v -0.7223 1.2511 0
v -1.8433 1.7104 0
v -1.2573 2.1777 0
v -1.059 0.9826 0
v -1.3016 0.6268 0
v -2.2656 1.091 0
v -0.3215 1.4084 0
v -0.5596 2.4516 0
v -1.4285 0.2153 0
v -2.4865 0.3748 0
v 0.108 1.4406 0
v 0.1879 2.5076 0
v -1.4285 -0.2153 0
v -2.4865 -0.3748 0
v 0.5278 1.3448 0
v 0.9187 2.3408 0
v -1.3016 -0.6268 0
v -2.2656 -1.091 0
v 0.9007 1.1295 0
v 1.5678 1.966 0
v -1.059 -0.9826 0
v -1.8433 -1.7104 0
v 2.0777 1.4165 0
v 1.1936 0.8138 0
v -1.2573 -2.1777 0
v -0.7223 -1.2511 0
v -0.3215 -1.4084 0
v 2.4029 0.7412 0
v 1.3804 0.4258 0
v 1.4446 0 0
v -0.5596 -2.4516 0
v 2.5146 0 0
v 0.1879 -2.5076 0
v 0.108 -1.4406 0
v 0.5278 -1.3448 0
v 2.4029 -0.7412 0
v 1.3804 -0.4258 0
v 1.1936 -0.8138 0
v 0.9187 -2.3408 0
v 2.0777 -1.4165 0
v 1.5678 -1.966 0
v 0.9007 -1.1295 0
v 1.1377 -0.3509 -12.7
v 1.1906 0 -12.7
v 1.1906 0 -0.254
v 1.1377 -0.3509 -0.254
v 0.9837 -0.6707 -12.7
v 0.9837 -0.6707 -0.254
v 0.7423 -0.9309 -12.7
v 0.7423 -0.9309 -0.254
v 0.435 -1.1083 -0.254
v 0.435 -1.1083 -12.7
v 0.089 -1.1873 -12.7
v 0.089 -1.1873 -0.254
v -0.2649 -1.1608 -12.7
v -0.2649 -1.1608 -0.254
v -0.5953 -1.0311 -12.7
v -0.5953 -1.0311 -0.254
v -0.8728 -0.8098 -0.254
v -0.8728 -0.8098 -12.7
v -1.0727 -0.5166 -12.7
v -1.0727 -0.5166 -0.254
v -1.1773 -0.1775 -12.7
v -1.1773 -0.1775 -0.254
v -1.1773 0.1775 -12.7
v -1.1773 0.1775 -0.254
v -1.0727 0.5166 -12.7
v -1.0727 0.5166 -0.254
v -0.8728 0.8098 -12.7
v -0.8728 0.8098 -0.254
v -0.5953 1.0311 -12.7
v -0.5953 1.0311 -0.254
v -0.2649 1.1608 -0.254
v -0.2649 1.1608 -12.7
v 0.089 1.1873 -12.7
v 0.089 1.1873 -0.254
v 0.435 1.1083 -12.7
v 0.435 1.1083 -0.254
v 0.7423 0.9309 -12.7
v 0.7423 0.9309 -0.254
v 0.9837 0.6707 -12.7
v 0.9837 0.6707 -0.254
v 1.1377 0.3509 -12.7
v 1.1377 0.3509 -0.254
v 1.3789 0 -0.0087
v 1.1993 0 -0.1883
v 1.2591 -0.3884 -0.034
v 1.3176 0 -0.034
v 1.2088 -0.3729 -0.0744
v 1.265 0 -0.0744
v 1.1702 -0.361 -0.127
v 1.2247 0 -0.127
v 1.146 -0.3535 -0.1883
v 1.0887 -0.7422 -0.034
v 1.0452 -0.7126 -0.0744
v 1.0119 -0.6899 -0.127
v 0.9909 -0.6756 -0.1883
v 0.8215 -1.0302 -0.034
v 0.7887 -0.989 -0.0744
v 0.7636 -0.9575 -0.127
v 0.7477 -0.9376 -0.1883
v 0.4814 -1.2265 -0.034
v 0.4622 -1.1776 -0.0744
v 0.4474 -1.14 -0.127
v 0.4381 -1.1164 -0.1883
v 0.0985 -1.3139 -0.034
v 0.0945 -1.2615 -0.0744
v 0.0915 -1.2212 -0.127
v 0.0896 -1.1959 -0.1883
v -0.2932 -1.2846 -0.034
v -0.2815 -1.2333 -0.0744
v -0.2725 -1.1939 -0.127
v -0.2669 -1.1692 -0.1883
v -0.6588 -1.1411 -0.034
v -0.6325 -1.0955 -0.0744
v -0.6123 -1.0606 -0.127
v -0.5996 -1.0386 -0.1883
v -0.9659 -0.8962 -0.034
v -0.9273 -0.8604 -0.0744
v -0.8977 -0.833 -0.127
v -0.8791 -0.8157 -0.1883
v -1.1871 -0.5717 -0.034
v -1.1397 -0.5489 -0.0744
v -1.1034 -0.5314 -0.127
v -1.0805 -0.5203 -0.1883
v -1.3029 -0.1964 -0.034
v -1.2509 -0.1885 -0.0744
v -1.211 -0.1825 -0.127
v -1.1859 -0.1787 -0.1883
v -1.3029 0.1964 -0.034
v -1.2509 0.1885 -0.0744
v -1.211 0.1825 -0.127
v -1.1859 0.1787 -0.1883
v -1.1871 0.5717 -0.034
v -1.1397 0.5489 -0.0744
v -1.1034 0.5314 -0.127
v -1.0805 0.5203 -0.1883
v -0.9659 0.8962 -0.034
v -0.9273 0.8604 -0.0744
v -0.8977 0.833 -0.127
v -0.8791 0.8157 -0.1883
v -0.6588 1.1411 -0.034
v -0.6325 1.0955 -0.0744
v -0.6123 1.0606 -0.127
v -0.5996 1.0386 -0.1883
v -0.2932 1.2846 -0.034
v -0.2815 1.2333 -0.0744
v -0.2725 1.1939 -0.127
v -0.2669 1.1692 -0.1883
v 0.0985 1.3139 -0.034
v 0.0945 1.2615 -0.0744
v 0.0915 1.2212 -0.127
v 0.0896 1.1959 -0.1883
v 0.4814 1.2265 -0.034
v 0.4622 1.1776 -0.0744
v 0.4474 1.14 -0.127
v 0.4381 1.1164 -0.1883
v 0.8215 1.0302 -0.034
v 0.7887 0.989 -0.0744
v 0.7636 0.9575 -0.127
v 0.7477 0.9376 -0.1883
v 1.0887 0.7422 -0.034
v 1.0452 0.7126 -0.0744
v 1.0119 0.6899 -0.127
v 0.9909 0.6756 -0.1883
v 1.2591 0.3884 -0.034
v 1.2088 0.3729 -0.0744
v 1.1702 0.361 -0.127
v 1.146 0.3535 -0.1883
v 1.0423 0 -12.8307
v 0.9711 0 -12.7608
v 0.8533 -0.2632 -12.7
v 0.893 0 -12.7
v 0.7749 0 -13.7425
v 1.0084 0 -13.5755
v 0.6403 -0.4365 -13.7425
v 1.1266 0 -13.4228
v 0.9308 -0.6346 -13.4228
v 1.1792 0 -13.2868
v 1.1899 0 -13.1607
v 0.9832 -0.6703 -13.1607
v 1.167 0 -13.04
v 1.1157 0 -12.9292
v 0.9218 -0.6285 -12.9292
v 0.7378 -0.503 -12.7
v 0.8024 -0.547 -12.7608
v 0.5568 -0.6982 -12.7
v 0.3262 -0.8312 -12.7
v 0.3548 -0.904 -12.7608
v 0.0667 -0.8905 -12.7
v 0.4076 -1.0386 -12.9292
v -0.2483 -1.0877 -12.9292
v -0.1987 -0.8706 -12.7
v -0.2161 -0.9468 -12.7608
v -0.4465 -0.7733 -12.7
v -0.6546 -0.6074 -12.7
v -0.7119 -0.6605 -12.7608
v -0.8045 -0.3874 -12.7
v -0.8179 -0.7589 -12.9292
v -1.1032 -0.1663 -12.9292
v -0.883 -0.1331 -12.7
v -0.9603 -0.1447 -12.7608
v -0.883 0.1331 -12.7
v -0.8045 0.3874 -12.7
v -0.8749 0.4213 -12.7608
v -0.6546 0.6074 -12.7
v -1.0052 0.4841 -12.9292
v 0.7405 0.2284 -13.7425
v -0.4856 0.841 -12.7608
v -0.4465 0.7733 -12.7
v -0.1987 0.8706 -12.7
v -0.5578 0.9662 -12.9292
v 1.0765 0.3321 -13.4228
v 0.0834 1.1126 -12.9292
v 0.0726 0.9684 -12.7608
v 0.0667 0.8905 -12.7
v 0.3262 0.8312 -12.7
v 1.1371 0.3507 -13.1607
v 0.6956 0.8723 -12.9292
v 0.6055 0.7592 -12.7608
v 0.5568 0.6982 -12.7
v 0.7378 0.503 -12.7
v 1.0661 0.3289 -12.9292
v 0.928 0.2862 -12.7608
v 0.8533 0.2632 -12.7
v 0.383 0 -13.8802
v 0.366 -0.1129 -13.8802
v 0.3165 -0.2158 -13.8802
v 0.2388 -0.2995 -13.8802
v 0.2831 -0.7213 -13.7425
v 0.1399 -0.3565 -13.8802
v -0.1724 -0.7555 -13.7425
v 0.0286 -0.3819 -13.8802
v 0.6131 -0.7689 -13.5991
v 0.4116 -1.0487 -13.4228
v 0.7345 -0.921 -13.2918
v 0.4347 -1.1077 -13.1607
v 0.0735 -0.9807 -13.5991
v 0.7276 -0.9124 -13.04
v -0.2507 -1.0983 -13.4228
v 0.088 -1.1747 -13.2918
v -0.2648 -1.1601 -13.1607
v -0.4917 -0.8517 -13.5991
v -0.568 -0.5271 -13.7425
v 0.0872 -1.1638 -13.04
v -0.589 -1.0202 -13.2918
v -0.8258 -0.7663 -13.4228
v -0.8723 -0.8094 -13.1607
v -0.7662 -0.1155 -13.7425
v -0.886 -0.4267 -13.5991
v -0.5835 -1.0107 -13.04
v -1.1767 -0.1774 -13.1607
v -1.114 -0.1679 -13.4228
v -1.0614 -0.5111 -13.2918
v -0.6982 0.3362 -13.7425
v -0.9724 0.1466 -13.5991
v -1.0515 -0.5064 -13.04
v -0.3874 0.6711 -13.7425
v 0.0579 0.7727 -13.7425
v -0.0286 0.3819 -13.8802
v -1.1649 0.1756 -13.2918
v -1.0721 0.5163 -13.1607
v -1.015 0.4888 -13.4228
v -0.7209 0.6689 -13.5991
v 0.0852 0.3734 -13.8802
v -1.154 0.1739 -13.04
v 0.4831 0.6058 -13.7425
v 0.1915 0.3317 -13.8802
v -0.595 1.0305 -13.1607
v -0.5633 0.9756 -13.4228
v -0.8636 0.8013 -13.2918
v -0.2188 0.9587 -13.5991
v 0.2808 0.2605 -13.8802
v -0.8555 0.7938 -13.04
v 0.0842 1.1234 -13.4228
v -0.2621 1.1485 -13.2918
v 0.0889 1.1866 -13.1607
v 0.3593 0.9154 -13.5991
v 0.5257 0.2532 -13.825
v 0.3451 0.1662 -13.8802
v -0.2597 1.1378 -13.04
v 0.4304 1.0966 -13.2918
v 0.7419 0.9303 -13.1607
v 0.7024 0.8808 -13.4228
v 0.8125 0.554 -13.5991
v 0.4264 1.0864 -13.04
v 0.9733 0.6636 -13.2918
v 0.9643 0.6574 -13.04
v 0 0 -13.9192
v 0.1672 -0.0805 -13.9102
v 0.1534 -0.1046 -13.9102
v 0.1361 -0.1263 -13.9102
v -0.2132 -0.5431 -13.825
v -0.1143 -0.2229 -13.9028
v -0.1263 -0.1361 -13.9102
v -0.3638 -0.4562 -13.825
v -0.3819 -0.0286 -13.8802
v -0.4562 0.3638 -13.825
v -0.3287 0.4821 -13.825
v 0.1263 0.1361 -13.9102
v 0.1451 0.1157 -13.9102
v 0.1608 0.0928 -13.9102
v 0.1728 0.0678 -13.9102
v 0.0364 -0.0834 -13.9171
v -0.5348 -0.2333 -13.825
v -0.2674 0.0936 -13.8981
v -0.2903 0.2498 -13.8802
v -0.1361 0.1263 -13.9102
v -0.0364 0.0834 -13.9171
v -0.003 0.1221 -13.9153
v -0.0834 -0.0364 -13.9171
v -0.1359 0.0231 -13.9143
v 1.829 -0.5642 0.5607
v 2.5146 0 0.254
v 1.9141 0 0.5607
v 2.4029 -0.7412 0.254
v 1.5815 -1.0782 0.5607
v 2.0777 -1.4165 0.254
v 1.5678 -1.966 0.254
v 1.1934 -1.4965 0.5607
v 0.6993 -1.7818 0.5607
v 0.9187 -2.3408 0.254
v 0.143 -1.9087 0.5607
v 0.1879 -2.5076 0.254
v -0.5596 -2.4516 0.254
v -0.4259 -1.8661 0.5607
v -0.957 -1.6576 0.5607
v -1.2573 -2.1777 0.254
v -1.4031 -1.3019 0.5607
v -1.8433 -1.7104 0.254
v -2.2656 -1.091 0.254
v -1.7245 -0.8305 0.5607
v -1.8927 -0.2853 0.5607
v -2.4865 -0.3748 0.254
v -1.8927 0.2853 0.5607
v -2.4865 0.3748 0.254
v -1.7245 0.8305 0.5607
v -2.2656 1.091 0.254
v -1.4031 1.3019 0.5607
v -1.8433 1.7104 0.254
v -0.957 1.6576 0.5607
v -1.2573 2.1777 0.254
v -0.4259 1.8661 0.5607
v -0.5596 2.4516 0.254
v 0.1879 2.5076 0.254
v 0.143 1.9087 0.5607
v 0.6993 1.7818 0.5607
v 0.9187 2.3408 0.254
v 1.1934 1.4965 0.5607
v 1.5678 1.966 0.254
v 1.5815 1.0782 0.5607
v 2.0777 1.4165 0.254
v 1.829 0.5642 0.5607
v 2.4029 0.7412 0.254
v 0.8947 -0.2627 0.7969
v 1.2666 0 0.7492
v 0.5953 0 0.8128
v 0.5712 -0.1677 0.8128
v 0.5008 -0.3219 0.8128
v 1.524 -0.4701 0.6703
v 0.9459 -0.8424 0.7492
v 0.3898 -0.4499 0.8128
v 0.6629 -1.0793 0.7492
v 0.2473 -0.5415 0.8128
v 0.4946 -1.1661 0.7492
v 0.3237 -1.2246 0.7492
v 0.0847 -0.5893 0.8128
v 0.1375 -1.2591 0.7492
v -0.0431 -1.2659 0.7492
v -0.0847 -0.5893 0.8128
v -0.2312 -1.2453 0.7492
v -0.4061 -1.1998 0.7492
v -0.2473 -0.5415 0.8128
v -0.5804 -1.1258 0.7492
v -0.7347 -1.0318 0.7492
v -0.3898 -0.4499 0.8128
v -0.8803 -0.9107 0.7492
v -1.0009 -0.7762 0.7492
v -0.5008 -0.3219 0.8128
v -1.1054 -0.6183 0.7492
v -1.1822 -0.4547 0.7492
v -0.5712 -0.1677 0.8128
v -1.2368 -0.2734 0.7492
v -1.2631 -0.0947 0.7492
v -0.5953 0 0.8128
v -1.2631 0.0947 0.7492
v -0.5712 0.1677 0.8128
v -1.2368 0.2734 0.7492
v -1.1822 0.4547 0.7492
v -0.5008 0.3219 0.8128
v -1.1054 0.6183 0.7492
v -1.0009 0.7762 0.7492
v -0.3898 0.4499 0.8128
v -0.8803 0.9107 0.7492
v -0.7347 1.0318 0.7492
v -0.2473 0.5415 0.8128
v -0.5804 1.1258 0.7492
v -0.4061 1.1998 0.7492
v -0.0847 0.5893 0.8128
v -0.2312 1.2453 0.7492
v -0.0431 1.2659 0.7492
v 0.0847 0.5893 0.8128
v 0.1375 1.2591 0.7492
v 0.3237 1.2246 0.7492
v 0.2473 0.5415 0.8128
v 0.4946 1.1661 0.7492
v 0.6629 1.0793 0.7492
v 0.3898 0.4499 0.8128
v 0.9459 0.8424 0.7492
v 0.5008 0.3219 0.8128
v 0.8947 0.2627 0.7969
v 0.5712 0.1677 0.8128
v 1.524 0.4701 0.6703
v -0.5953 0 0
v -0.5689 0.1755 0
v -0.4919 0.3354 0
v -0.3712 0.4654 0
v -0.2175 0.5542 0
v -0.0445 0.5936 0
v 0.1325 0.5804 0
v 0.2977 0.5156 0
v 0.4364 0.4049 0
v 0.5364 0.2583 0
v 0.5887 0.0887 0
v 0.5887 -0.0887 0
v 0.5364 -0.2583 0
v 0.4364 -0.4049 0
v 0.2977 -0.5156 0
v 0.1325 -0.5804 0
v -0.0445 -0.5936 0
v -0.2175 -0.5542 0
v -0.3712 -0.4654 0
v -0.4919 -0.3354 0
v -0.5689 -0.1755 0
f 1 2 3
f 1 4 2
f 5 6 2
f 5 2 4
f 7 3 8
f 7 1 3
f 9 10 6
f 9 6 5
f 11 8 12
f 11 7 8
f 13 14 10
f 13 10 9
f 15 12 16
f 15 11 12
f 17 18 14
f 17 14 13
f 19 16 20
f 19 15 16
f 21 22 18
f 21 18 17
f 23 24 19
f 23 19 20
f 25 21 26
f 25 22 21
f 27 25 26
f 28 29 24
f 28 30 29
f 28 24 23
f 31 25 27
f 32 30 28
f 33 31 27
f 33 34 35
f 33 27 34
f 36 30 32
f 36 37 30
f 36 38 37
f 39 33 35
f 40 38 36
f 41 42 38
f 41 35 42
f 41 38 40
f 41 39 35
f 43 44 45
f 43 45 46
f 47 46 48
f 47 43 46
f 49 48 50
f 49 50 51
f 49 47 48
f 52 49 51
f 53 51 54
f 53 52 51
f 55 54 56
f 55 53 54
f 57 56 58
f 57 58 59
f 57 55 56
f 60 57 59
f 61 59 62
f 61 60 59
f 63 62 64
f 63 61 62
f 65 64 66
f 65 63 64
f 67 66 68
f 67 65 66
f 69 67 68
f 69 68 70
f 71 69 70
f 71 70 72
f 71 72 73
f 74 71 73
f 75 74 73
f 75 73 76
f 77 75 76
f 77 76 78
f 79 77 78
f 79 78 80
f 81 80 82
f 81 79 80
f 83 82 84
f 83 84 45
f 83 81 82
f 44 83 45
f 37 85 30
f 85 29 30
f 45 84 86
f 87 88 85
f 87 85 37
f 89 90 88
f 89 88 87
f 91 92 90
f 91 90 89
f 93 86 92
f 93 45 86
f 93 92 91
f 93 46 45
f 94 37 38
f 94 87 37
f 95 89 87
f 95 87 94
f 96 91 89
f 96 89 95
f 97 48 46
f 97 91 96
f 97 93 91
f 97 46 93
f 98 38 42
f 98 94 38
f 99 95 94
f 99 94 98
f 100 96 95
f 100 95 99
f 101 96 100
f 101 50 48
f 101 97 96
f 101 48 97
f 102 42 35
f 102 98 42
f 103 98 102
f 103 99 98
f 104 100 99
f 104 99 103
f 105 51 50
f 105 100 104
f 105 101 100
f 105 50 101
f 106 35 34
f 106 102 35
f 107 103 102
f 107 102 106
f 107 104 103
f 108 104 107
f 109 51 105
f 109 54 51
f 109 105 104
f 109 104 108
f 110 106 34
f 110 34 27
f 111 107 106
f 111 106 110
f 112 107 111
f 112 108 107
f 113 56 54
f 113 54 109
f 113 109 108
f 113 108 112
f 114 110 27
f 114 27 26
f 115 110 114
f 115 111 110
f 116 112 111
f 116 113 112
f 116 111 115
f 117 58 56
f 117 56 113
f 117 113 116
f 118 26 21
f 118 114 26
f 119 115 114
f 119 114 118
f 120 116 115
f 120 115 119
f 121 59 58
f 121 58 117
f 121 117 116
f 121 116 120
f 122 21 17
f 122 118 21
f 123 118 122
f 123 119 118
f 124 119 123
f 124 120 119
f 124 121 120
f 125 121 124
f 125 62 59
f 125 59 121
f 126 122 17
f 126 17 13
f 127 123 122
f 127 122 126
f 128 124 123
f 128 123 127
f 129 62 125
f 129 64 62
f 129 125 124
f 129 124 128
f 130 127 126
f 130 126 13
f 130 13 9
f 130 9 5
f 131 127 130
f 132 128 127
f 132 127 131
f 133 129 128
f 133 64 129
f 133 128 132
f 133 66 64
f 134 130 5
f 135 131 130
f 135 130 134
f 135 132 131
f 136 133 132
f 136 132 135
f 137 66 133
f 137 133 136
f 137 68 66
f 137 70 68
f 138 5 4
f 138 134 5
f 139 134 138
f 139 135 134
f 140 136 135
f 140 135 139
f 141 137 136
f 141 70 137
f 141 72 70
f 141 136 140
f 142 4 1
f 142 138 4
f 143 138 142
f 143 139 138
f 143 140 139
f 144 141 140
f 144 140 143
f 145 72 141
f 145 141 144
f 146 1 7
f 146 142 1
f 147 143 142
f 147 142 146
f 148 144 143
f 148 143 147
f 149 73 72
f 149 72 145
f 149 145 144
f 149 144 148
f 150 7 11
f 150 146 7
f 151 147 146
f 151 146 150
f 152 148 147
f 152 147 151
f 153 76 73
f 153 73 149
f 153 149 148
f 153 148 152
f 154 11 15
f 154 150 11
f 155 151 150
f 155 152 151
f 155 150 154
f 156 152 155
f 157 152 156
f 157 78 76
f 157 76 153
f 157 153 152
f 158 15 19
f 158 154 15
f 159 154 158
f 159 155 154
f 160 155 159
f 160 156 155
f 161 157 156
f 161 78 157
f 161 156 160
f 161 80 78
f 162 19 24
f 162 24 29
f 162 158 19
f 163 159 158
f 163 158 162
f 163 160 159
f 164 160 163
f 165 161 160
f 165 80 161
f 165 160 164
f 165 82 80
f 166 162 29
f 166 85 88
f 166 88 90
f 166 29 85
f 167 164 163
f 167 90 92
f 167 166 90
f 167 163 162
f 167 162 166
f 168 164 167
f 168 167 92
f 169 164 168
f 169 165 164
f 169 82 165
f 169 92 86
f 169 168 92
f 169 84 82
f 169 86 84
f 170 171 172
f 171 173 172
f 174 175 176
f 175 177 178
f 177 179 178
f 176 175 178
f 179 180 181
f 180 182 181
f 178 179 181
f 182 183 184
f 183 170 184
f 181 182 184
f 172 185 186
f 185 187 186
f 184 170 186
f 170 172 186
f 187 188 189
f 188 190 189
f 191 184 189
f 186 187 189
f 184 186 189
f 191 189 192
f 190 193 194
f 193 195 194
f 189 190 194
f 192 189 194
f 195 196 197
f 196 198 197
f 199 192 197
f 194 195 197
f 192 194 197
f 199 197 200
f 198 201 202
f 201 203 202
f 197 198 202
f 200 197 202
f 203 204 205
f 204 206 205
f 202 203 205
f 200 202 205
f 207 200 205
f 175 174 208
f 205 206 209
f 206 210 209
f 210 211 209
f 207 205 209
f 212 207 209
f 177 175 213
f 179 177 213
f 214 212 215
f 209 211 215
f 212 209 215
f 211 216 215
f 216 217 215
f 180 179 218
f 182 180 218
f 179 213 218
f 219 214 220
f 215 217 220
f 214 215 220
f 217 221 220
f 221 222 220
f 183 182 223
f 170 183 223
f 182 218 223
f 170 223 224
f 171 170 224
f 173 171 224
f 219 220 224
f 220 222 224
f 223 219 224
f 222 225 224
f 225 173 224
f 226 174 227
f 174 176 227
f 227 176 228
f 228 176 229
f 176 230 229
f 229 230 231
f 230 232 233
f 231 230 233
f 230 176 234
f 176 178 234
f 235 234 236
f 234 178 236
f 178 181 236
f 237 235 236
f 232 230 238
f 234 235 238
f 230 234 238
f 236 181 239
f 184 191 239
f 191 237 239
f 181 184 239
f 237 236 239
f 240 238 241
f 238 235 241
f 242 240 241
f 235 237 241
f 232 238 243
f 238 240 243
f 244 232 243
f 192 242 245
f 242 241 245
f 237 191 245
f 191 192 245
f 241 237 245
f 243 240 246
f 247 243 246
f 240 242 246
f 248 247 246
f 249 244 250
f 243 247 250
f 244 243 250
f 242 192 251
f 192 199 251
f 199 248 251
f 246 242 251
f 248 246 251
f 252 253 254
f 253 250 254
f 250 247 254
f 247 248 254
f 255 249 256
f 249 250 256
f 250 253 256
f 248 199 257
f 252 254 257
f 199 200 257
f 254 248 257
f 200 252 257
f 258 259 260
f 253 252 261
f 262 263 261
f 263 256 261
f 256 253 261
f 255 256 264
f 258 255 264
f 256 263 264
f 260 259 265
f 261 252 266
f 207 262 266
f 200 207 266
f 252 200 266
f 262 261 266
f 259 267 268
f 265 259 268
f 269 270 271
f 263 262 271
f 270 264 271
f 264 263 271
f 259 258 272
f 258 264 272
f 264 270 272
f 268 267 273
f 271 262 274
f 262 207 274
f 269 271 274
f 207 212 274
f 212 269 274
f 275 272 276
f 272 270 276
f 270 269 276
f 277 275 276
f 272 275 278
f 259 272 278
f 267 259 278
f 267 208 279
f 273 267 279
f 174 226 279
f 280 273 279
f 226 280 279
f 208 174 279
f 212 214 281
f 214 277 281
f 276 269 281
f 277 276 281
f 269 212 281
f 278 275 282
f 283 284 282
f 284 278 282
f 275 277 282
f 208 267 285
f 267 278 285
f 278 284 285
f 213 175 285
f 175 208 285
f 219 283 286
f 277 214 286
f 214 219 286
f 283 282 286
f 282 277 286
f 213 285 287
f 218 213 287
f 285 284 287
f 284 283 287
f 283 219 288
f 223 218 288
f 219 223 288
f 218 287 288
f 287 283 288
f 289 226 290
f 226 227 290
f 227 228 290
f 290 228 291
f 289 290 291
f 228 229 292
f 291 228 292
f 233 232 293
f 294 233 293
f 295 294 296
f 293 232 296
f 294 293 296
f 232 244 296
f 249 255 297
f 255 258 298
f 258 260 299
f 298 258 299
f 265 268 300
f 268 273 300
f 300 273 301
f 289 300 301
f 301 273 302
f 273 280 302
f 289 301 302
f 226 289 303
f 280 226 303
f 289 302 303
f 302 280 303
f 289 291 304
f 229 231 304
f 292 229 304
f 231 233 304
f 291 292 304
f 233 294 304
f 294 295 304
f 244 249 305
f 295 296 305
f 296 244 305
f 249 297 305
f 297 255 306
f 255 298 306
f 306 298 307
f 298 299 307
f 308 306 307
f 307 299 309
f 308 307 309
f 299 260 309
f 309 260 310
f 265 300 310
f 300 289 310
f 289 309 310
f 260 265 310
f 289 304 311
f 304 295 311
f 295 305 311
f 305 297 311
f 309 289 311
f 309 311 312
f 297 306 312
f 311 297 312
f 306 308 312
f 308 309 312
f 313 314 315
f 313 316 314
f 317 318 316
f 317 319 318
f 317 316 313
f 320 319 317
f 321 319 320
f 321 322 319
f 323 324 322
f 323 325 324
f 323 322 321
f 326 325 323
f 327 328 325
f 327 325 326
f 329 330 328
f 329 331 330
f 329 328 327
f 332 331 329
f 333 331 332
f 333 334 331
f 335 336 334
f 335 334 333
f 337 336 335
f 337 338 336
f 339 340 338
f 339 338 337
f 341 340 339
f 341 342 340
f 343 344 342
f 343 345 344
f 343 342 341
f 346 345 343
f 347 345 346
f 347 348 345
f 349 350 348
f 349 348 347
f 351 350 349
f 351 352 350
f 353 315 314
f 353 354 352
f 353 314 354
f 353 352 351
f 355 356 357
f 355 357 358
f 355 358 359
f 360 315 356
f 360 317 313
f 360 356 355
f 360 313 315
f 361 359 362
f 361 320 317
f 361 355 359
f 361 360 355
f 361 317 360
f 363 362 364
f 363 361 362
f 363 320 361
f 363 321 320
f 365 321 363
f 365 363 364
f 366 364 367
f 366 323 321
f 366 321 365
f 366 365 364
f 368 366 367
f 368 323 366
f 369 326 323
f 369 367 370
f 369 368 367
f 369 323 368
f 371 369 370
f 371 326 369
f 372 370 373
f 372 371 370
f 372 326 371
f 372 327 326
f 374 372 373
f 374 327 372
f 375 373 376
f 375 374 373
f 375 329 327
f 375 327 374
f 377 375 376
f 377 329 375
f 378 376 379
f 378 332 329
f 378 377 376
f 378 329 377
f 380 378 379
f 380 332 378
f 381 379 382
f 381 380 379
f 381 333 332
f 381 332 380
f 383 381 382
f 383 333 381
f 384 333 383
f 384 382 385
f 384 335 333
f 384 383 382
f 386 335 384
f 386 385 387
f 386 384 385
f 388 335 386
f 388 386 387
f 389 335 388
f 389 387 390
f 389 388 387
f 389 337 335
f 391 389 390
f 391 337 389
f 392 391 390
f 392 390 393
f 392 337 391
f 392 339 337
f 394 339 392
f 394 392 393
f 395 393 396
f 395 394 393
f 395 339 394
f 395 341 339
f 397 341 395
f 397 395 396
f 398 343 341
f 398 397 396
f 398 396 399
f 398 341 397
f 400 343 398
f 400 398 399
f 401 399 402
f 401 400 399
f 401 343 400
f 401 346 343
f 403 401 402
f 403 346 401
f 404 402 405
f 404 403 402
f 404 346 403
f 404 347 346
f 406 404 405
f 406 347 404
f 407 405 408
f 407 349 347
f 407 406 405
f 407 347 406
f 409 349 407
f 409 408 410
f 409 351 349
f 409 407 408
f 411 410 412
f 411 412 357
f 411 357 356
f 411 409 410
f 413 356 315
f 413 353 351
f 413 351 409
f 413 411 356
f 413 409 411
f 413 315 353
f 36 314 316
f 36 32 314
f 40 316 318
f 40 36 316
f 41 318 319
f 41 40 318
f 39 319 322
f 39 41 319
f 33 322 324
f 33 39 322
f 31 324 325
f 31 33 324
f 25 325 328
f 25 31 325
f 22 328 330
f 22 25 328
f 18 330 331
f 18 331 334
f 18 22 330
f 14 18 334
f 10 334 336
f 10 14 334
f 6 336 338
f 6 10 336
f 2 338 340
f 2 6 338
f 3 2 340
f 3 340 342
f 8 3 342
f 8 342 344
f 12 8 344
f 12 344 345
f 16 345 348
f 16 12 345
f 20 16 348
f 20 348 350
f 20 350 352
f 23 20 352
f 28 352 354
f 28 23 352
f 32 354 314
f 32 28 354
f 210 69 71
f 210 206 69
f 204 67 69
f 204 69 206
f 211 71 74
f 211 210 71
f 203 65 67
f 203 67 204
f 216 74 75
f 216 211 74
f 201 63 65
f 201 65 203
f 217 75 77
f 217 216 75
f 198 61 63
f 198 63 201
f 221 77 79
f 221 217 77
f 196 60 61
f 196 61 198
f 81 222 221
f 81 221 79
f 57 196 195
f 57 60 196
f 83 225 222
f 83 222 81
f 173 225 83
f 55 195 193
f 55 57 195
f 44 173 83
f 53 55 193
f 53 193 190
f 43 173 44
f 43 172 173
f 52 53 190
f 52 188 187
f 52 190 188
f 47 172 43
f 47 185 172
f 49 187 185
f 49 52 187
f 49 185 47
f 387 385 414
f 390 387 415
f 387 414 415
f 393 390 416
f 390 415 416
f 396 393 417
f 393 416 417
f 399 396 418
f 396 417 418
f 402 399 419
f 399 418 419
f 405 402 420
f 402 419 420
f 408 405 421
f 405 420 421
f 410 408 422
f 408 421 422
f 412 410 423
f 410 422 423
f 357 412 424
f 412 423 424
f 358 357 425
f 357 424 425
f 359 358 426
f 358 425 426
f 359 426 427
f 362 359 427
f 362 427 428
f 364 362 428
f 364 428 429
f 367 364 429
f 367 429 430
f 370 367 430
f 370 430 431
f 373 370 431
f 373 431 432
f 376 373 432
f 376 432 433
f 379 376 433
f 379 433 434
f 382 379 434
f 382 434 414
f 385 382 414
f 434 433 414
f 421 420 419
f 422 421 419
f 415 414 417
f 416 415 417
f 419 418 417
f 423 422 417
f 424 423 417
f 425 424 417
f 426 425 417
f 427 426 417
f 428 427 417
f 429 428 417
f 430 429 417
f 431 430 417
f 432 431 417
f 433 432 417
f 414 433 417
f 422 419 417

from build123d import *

# Parameters (mm, degrees)
CUT_EXTRUDE1_DEPTH      = 21.178633531
CUT_EXTRUDE1_DEPTH_BACK = 21.178633531
CUT_EXTRUDE2_DEPTH      = 21.178633531
CUT_EXTRUDE2_DEPTH_BACK = 21.178633531
FILLET2_R               = 0.254
SKETCH7_R               = 0.5953125
CUT_EXTRUDE3_DEPTH      = 21.178633531


with BuildPart() as part:
    # Sketch2 → Revolve1 (revolve)
    with BuildSketch(Plane(origin=(0, 0, 0), x_dir=(0, 0, -1), z_dir=(1, 0, 0)), mode=Mode.PRIVATE) as revolve1_sk:
        with BuildLine():
            Line((-19.8628, 0), (-19.8628, 0.5953125))
            Line((-19.8628, 0.5953125), (-0.8128, 0.5953125))
            ThreePointArc((-0.8128, 0.5953125), (-0.670258675, 1.594802613), (-0.254, 2.5146))
            Line((-0.254, 2.5146), (0, 2.5146))
            Line((0, 2.5146), (0, 1.190625))
            Line((0, 1.190625), (12.7, 1.190625))
            Line((12.7, 1.190625), (12.7, 0.89296875))
            add(Edge.make_bspline(
                [(13.9192, 0), (13.9192, 2.637532552), (12.7, 0.89296875)],
                knots=[4.71238898, 4.71238898, 4.71238898, 7.005919555, 7.005919555, 7.005919555], degree=2, weights=[1, 0.411437828, 1]))
            Line((13.9192, 0), (12.7, 0))
            Line((12.7, 0), (-19.8628, 0))
        make_face()
    revolve(revolve1_sk.sketch.rotate(Axis((0, 0, 19.8628), (0, 0, -1)), 90), axis=Axis((0, 0, 19.8628), (0, 0, -1)))

    # Sketch3 → Cut-Extrude1 (cut, two sides: drawn at the far end of the back side and taken through both)
    with BuildSketch(Plane(origin=(0, 0, 0), x_dir=(1, 0, 0), z_dir=(0, 1, 0)).offset(-CUT_EXTRUDE1_DEPTH_BACK)):
        Polygon((0, -19.8628), (0.7985125, -18.822158249), (0.7985125, -20.3708), (-0.7985125, -20.3708), (-0.7985125, -18.822158249), align=None)
    extrude(amount=CUT_EXTRUDE1_DEPTH + CUT_EXTRUDE1_DEPTH_BACK, mode=Mode.SUBTRACT)

    # Sketch4 → Cut-Extrude2 (cut, two sides: drawn at the far end of the back side and taken through both)
    with BuildSketch(Plane(origin=(0, 0, 0), x_dir=(0, 0, -1), z_dir=(1, 0, 0)).offset(-CUT_EXTRUDE2_DEPTH_BACK)):
        Polygon((-20.1168, 0), (-19.0134875, 1.1033125), (-20.3708, 1.1033125), (-20.3708, -1.1033125), (-19.0134875, -1.1033125), align=None)
    extrude(amount=CUT_EXTRUDE2_DEPTH + CUT_EXTRUDE2_DEPTH_BACK, mode=Mode.SUBTRACT)

    # Fillet2
    fillet2_edges = [part.edges().sort_by_distance(p)[0] for p in [
        (-1.190625, 0, 0),
    ]]
    fillet(fillet2_edges, radius=FILLET2_R)

    # Sketch7 → Cut-Extrude3 (cut, through all)
    with BuildSketch(Plane(origin=(0, 0, 0), x_dir=(-1, 0, 0), z_dir=(0, 0, -1))):
        Circle(SKETCH7_R)
    extrude(amount=-CUT_EXTRUDE3_DEPTH, mode=Mode.SUBTRACT)


solid = part.part
